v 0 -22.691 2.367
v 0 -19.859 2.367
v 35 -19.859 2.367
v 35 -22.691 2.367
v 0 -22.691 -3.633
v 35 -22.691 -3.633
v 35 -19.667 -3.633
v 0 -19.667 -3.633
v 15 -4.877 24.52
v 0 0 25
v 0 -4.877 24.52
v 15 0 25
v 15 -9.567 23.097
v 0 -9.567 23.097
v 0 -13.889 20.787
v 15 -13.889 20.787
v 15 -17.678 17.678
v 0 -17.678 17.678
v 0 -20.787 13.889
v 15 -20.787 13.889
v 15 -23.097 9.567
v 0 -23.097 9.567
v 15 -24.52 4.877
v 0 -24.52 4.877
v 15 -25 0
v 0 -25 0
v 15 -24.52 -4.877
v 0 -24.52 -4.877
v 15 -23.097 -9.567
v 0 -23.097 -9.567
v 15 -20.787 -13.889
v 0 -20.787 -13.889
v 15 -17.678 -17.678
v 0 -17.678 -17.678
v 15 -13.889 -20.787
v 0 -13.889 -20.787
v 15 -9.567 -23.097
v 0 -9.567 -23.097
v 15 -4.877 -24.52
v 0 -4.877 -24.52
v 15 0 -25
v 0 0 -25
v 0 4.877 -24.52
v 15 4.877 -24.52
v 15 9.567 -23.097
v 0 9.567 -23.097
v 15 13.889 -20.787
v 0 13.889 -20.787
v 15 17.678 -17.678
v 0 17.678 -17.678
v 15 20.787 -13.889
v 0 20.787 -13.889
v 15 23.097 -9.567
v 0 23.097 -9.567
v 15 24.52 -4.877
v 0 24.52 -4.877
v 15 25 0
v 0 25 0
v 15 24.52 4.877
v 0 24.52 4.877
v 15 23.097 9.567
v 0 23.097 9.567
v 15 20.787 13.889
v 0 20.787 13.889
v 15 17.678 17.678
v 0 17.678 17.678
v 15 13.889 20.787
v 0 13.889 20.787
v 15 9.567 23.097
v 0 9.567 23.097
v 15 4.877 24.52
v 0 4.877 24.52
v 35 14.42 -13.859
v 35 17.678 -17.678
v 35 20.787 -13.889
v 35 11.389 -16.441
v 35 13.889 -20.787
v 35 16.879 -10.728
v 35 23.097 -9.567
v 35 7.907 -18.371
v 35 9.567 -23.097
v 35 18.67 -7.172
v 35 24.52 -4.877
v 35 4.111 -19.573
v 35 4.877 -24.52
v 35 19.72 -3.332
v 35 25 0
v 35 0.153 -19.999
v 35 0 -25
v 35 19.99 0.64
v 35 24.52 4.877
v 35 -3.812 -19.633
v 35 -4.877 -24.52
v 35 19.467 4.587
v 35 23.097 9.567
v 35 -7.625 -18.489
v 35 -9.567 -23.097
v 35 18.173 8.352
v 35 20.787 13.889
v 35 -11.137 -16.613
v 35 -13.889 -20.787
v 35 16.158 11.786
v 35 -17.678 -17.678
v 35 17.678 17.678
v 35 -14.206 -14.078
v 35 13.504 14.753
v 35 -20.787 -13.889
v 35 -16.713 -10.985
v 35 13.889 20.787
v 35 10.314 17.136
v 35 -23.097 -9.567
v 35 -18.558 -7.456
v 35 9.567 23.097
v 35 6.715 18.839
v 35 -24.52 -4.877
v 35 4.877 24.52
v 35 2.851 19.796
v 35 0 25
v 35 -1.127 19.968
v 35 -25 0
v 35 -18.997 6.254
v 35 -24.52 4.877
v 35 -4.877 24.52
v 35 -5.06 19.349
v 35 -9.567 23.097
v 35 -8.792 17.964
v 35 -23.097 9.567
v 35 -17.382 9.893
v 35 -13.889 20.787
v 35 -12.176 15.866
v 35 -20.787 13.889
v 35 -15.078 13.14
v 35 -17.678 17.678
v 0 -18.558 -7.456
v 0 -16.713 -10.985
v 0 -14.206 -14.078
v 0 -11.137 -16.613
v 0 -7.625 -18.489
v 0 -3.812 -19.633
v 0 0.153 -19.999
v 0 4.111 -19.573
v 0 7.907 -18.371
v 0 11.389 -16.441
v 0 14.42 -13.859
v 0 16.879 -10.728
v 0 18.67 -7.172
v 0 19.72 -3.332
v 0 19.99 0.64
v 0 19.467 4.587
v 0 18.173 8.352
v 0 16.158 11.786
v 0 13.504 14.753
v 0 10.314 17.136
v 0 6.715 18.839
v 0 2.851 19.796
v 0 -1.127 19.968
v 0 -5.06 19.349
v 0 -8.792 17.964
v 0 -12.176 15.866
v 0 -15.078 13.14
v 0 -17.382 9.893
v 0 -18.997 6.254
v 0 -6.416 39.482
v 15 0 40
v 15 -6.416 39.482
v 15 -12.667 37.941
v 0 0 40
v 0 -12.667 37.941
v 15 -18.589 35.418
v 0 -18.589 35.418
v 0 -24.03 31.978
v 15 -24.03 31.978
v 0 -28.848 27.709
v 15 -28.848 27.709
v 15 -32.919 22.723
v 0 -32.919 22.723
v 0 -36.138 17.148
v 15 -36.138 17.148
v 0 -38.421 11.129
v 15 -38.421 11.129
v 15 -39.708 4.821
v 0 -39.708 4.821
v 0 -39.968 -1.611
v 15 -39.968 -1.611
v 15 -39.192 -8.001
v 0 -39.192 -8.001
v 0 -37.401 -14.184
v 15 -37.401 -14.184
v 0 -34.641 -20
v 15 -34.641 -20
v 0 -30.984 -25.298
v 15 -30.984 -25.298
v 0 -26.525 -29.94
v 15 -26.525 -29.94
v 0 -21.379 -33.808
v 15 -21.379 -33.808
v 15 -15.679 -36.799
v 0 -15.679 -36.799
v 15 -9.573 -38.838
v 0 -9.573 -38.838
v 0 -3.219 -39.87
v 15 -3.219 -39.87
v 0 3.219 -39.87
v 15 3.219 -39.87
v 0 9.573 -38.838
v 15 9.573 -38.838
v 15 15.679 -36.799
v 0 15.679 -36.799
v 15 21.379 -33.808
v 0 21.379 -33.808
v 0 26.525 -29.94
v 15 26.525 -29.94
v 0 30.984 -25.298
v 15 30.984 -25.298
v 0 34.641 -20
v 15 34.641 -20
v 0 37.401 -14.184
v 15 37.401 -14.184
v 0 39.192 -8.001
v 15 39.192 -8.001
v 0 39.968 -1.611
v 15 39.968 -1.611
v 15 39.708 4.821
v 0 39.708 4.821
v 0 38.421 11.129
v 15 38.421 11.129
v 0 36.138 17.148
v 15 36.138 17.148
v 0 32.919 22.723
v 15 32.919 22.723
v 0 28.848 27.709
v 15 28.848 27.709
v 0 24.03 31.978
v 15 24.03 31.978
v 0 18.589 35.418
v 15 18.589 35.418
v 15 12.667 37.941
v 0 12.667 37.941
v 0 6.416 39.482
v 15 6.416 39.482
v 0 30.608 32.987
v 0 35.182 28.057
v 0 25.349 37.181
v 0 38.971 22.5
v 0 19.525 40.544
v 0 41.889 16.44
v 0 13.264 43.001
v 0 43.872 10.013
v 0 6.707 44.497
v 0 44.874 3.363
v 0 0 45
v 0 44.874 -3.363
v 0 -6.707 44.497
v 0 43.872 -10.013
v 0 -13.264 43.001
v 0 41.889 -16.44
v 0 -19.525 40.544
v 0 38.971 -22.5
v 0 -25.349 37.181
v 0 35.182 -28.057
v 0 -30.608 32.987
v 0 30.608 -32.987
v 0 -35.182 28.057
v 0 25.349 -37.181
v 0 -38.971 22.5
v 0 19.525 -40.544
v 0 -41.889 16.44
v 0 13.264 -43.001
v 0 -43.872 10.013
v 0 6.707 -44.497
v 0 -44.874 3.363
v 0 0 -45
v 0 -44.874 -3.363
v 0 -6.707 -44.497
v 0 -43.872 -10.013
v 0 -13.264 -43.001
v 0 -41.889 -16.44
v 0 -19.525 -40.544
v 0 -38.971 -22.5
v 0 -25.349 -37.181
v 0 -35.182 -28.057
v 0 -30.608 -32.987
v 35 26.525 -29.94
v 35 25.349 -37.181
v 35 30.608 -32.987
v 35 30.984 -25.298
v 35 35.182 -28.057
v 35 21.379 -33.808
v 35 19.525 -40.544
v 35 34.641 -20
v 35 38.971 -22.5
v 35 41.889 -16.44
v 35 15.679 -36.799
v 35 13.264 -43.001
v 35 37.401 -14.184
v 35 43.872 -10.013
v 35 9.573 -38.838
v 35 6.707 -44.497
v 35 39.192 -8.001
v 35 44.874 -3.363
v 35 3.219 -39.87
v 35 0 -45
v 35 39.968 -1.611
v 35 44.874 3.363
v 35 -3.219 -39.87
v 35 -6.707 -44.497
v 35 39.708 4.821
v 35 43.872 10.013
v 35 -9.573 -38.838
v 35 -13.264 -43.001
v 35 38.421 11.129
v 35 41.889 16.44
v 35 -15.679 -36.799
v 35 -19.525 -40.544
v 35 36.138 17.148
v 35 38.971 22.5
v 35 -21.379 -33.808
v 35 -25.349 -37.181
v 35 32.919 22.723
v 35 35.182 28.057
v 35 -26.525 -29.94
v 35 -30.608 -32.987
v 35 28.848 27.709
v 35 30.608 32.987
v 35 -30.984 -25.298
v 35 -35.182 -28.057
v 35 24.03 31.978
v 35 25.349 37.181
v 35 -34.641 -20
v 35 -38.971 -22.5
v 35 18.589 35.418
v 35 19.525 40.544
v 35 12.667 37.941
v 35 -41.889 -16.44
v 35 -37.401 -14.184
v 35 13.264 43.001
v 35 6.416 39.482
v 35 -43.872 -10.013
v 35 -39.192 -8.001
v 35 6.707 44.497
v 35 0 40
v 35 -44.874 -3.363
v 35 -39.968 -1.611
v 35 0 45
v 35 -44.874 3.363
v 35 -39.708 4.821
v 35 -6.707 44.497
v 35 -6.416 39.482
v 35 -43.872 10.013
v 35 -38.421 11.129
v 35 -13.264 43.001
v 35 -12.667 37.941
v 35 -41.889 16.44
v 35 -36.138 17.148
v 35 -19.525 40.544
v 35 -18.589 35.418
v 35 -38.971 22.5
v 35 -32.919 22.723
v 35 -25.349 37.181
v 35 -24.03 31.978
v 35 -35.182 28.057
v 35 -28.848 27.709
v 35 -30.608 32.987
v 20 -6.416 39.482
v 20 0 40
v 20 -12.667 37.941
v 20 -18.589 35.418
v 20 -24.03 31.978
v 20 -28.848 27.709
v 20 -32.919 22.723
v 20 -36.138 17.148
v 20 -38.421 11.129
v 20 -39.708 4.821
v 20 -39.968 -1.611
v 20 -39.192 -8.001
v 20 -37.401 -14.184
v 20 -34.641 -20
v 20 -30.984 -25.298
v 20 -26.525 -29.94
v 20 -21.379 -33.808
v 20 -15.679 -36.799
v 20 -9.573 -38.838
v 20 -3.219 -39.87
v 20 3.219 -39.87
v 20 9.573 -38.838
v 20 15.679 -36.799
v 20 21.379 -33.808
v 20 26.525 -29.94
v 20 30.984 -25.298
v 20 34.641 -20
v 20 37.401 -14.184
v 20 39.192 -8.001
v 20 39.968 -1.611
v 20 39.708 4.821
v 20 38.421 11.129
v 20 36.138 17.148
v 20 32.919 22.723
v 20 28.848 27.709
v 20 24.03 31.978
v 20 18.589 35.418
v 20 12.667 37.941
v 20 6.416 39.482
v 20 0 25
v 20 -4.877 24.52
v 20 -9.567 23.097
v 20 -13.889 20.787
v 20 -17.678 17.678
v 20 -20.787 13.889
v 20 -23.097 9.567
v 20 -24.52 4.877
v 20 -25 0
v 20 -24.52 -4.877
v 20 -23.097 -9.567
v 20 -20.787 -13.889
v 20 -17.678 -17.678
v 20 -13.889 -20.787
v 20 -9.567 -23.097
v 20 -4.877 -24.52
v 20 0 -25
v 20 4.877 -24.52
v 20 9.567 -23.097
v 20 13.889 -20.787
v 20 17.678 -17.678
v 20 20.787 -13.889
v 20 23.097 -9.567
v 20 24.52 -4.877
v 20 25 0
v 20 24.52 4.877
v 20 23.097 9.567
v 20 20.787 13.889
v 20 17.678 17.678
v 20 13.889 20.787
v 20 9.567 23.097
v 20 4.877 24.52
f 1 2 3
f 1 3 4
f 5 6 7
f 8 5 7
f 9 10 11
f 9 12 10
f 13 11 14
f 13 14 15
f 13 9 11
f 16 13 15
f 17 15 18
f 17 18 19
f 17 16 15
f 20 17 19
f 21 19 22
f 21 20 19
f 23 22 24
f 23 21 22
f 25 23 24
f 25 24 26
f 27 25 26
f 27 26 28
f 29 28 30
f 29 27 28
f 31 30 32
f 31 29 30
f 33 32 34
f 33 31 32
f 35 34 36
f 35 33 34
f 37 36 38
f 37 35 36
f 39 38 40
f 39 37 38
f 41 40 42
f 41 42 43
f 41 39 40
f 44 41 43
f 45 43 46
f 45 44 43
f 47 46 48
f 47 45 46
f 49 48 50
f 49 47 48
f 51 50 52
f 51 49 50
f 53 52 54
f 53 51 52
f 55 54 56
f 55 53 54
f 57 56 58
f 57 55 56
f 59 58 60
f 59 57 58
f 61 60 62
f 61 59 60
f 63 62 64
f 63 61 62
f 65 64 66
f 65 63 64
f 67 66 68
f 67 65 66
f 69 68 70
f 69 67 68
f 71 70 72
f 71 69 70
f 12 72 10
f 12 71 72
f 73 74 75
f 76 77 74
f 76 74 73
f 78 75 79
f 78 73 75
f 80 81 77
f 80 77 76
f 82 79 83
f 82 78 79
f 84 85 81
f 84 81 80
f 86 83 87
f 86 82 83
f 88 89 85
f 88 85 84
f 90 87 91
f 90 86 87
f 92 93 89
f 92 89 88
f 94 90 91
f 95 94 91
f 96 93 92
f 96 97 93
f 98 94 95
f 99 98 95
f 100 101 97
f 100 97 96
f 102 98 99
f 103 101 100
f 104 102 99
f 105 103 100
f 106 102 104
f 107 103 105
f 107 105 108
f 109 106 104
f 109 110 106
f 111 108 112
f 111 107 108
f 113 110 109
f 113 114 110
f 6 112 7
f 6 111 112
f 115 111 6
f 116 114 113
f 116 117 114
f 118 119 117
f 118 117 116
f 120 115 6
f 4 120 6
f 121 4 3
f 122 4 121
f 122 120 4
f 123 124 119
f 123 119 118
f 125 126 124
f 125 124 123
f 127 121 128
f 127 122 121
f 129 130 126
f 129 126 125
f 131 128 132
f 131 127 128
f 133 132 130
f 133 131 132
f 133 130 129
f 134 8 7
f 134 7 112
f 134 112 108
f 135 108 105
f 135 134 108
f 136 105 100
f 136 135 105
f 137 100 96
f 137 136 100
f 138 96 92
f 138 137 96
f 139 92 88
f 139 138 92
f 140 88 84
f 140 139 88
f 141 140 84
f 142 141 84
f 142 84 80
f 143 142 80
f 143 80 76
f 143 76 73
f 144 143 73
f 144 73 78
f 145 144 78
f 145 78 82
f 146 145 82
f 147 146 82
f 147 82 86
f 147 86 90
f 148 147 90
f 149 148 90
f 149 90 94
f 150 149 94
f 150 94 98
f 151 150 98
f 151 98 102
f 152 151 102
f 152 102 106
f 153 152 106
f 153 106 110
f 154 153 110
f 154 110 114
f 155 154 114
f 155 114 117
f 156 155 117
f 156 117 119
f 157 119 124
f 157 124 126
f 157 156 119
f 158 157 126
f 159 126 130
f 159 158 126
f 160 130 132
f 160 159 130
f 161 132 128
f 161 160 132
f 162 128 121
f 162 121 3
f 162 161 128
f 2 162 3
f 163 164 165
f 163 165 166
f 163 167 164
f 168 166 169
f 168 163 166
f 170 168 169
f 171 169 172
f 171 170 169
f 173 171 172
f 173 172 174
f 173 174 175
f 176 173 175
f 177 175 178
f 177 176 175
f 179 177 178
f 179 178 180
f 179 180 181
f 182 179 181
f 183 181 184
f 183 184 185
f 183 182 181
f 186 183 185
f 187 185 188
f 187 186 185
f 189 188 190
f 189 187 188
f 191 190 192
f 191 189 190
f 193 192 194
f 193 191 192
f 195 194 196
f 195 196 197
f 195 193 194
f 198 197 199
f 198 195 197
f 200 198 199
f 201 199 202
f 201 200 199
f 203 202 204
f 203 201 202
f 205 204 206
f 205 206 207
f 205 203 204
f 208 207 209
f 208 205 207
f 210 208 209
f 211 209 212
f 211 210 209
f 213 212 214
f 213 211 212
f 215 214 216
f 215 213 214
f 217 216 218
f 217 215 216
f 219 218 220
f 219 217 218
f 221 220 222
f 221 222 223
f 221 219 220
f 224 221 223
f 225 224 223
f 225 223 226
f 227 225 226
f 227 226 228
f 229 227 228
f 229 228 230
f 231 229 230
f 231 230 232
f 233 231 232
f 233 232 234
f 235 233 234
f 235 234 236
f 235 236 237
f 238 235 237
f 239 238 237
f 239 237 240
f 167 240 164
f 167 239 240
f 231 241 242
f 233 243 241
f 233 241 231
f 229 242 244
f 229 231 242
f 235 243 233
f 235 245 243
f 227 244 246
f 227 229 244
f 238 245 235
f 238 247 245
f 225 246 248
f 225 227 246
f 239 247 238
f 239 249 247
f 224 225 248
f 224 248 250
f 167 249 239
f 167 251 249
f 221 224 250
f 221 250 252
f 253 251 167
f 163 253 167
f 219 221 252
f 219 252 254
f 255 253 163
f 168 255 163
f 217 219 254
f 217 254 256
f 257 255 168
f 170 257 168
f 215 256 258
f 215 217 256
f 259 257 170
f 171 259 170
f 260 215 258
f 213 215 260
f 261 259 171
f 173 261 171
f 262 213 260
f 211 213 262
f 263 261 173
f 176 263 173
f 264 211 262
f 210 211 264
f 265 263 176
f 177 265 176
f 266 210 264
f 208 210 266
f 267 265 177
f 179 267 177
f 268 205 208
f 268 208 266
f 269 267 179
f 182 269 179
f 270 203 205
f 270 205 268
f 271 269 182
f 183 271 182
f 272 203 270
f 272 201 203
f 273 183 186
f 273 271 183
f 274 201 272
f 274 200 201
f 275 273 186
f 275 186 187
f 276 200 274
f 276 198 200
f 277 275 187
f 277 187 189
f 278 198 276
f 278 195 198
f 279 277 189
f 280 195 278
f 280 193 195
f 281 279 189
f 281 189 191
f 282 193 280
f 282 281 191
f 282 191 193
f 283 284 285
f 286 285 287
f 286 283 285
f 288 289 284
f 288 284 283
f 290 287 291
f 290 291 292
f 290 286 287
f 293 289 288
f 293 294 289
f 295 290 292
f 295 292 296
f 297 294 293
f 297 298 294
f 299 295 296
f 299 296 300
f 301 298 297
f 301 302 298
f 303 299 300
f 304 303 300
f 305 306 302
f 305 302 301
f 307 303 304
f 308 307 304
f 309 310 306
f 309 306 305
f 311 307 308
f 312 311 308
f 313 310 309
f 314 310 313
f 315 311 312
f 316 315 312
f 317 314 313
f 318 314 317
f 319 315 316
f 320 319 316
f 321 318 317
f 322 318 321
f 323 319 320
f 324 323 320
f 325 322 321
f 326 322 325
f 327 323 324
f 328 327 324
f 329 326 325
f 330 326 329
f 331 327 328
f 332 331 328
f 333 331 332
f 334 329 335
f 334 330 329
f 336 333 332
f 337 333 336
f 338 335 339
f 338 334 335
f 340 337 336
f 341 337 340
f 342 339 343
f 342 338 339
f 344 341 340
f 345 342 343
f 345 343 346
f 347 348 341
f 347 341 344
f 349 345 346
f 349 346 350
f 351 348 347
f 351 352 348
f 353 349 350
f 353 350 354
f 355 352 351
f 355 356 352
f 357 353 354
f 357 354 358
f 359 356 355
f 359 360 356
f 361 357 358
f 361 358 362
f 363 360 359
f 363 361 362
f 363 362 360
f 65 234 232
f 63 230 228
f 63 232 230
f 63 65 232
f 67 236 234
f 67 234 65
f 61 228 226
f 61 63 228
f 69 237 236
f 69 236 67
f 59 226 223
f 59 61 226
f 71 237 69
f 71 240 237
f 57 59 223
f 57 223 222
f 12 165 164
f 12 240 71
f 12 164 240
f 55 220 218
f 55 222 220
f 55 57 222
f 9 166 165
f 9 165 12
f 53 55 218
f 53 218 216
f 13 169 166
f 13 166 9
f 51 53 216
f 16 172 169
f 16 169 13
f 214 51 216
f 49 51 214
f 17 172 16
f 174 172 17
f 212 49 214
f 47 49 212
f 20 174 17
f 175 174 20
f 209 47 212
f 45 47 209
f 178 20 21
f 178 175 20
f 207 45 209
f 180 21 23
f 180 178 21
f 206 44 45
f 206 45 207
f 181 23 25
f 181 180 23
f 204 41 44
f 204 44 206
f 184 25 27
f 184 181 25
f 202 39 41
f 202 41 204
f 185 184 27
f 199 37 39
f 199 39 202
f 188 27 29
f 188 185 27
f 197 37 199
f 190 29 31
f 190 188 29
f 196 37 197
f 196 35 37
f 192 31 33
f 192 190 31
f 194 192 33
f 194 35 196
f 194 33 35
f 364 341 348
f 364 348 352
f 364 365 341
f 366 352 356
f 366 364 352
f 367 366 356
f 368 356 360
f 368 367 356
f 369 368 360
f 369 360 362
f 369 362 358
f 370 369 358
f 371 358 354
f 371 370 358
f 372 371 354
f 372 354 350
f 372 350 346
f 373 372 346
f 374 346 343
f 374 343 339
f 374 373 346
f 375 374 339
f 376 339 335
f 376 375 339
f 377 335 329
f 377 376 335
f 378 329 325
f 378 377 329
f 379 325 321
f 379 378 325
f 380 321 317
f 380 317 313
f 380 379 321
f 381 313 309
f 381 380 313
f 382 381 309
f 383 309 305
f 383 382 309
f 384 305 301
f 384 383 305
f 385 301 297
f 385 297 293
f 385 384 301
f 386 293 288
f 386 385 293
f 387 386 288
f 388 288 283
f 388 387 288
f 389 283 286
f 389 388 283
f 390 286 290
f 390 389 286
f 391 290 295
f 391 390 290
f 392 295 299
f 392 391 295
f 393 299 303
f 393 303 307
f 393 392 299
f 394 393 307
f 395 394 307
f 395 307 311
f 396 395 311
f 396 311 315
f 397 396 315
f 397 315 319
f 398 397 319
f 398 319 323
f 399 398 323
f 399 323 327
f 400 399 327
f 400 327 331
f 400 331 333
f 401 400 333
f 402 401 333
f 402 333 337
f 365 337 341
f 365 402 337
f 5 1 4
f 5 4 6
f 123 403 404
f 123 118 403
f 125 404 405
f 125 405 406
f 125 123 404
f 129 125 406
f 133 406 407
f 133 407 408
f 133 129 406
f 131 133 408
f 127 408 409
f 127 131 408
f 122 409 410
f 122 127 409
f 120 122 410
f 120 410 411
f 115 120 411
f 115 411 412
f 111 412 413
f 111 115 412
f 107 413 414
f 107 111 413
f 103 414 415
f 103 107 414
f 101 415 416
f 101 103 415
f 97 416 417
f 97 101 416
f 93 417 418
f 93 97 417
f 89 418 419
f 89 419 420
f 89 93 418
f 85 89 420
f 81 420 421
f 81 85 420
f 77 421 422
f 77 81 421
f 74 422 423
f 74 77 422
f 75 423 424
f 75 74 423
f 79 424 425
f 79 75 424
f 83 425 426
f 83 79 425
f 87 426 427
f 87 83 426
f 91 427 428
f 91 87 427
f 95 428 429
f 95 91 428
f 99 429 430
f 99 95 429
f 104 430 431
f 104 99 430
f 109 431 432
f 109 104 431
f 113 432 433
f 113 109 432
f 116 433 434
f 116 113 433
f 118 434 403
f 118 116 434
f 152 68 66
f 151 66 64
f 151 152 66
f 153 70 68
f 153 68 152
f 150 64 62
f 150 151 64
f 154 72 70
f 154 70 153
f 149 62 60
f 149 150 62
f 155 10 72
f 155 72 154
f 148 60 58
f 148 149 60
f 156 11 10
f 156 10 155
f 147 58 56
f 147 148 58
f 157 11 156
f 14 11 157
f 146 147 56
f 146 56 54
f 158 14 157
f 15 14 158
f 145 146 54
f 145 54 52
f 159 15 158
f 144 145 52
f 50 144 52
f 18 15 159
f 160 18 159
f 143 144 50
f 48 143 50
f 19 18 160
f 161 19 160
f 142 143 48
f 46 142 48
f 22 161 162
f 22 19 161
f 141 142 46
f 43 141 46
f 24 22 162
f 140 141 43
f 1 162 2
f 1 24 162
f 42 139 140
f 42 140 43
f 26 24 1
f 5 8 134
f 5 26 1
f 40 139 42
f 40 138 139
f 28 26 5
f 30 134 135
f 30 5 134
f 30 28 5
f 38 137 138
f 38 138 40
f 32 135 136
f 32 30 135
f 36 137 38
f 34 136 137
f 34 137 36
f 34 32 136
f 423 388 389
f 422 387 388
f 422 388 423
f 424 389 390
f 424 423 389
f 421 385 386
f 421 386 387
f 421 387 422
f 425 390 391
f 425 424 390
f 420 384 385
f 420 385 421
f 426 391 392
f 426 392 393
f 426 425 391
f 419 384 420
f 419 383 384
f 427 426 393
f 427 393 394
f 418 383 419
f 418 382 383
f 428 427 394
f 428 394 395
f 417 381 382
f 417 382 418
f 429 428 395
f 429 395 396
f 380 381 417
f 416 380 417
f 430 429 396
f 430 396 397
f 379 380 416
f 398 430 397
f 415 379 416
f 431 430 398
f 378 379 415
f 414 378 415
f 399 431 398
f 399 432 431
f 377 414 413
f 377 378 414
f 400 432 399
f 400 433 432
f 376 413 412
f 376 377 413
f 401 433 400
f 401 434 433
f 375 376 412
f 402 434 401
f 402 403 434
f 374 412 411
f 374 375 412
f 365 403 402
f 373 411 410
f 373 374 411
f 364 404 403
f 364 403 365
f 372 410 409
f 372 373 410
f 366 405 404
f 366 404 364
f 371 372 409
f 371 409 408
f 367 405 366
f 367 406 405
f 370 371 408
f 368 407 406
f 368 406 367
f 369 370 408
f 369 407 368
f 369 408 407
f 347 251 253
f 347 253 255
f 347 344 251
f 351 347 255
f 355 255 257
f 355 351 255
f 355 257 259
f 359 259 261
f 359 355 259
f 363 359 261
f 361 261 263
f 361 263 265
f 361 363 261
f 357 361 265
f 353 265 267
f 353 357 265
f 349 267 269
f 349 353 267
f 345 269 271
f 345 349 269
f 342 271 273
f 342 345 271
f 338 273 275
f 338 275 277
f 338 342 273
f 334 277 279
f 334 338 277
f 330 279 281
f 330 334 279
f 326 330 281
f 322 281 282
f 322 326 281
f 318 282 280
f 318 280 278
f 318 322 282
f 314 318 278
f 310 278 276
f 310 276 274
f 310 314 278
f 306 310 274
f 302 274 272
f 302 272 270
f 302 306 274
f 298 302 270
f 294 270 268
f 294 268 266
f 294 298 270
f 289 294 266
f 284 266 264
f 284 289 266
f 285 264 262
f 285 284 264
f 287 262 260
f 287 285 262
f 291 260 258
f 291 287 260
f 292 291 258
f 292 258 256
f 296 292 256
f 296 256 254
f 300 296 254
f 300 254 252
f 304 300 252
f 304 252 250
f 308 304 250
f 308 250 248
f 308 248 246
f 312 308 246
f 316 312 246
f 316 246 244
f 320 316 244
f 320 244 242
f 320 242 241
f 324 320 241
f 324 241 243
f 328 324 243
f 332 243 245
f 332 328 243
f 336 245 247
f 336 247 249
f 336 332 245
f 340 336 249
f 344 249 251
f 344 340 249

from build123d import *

# Parameters (mm, degrees)
CUT_EXTRUDE1_START = -35
CUT_EXTRUDE1_DEPTH = 35
CUT_EXTRUDE2_DEPTH = 35


with BuildPart() as part:
    # Sketch2 → Revolve3 (revolve)
    with BuildSketch(Plane(origin=(0, 0, 0), x_dir=(1, 0, 0), z_dir=(0, 1, 0)), mode=Mode.PRIVATE) as revolve3_sk:
        Polygon((35, 20), (0, 20), (0, 25), (15, 25), (15, 40), (0, 40), (0, 45), (35, 45), (35, 40), (20, 40), (20, 25), (35, 25), align=None)
    revolve(revolve3_sk.sketch.rotate(Axis((0, 0, 0), (1, 0, 0)), 180), axis=Axis((0, 0, 0), (1, 0, 0)))

    # Sketch5 → Cut-Extrude1 (cut)
    with BuildSketch(Plane(origin=(35, 0, 0), x_dir=(0, 0, -1), z_dir=(1, 0, 0)).offset(CUT_EXTRUDE1_START)):
        with BuildLine():
            Line((-2.36724254, -19.85940993), (-2.36724254, -22.690863933))
            Line((-2.36724254, -22.690863933), (3.63275746, -22.690863933))
            Line((3.63275746, -22.690863933), (3.63275746, -19.85940993))
            Line((3.63275746, -19.85940993), (2.36724254, -19.85940993))
            ThreePointArc((2.36724254, -19.85940993), (0, -20), (-2.36724254, -19.85940993))
        make_face()
    extrude(amount=CUT_EXTRUDE1_DEPTH, mode=Mode.SUBTRACT)

    # Sketch6 → Cut-Extrude2 (cut)
    with BuildSketch(Plane(origin=(35, 0, 0), x_dir=(0, 0, -1), z_dir=(1, 0, 0))):
        Polygon((3.63275746, -19.85940993), (3.63275746, -19.592754897), (2.36724254, -19.85940993), align=None)
    extrude(amount=-CUT_EXTRUDE2_DEPTH, mode=Mode.SUBTRACT)


solid = part.part
